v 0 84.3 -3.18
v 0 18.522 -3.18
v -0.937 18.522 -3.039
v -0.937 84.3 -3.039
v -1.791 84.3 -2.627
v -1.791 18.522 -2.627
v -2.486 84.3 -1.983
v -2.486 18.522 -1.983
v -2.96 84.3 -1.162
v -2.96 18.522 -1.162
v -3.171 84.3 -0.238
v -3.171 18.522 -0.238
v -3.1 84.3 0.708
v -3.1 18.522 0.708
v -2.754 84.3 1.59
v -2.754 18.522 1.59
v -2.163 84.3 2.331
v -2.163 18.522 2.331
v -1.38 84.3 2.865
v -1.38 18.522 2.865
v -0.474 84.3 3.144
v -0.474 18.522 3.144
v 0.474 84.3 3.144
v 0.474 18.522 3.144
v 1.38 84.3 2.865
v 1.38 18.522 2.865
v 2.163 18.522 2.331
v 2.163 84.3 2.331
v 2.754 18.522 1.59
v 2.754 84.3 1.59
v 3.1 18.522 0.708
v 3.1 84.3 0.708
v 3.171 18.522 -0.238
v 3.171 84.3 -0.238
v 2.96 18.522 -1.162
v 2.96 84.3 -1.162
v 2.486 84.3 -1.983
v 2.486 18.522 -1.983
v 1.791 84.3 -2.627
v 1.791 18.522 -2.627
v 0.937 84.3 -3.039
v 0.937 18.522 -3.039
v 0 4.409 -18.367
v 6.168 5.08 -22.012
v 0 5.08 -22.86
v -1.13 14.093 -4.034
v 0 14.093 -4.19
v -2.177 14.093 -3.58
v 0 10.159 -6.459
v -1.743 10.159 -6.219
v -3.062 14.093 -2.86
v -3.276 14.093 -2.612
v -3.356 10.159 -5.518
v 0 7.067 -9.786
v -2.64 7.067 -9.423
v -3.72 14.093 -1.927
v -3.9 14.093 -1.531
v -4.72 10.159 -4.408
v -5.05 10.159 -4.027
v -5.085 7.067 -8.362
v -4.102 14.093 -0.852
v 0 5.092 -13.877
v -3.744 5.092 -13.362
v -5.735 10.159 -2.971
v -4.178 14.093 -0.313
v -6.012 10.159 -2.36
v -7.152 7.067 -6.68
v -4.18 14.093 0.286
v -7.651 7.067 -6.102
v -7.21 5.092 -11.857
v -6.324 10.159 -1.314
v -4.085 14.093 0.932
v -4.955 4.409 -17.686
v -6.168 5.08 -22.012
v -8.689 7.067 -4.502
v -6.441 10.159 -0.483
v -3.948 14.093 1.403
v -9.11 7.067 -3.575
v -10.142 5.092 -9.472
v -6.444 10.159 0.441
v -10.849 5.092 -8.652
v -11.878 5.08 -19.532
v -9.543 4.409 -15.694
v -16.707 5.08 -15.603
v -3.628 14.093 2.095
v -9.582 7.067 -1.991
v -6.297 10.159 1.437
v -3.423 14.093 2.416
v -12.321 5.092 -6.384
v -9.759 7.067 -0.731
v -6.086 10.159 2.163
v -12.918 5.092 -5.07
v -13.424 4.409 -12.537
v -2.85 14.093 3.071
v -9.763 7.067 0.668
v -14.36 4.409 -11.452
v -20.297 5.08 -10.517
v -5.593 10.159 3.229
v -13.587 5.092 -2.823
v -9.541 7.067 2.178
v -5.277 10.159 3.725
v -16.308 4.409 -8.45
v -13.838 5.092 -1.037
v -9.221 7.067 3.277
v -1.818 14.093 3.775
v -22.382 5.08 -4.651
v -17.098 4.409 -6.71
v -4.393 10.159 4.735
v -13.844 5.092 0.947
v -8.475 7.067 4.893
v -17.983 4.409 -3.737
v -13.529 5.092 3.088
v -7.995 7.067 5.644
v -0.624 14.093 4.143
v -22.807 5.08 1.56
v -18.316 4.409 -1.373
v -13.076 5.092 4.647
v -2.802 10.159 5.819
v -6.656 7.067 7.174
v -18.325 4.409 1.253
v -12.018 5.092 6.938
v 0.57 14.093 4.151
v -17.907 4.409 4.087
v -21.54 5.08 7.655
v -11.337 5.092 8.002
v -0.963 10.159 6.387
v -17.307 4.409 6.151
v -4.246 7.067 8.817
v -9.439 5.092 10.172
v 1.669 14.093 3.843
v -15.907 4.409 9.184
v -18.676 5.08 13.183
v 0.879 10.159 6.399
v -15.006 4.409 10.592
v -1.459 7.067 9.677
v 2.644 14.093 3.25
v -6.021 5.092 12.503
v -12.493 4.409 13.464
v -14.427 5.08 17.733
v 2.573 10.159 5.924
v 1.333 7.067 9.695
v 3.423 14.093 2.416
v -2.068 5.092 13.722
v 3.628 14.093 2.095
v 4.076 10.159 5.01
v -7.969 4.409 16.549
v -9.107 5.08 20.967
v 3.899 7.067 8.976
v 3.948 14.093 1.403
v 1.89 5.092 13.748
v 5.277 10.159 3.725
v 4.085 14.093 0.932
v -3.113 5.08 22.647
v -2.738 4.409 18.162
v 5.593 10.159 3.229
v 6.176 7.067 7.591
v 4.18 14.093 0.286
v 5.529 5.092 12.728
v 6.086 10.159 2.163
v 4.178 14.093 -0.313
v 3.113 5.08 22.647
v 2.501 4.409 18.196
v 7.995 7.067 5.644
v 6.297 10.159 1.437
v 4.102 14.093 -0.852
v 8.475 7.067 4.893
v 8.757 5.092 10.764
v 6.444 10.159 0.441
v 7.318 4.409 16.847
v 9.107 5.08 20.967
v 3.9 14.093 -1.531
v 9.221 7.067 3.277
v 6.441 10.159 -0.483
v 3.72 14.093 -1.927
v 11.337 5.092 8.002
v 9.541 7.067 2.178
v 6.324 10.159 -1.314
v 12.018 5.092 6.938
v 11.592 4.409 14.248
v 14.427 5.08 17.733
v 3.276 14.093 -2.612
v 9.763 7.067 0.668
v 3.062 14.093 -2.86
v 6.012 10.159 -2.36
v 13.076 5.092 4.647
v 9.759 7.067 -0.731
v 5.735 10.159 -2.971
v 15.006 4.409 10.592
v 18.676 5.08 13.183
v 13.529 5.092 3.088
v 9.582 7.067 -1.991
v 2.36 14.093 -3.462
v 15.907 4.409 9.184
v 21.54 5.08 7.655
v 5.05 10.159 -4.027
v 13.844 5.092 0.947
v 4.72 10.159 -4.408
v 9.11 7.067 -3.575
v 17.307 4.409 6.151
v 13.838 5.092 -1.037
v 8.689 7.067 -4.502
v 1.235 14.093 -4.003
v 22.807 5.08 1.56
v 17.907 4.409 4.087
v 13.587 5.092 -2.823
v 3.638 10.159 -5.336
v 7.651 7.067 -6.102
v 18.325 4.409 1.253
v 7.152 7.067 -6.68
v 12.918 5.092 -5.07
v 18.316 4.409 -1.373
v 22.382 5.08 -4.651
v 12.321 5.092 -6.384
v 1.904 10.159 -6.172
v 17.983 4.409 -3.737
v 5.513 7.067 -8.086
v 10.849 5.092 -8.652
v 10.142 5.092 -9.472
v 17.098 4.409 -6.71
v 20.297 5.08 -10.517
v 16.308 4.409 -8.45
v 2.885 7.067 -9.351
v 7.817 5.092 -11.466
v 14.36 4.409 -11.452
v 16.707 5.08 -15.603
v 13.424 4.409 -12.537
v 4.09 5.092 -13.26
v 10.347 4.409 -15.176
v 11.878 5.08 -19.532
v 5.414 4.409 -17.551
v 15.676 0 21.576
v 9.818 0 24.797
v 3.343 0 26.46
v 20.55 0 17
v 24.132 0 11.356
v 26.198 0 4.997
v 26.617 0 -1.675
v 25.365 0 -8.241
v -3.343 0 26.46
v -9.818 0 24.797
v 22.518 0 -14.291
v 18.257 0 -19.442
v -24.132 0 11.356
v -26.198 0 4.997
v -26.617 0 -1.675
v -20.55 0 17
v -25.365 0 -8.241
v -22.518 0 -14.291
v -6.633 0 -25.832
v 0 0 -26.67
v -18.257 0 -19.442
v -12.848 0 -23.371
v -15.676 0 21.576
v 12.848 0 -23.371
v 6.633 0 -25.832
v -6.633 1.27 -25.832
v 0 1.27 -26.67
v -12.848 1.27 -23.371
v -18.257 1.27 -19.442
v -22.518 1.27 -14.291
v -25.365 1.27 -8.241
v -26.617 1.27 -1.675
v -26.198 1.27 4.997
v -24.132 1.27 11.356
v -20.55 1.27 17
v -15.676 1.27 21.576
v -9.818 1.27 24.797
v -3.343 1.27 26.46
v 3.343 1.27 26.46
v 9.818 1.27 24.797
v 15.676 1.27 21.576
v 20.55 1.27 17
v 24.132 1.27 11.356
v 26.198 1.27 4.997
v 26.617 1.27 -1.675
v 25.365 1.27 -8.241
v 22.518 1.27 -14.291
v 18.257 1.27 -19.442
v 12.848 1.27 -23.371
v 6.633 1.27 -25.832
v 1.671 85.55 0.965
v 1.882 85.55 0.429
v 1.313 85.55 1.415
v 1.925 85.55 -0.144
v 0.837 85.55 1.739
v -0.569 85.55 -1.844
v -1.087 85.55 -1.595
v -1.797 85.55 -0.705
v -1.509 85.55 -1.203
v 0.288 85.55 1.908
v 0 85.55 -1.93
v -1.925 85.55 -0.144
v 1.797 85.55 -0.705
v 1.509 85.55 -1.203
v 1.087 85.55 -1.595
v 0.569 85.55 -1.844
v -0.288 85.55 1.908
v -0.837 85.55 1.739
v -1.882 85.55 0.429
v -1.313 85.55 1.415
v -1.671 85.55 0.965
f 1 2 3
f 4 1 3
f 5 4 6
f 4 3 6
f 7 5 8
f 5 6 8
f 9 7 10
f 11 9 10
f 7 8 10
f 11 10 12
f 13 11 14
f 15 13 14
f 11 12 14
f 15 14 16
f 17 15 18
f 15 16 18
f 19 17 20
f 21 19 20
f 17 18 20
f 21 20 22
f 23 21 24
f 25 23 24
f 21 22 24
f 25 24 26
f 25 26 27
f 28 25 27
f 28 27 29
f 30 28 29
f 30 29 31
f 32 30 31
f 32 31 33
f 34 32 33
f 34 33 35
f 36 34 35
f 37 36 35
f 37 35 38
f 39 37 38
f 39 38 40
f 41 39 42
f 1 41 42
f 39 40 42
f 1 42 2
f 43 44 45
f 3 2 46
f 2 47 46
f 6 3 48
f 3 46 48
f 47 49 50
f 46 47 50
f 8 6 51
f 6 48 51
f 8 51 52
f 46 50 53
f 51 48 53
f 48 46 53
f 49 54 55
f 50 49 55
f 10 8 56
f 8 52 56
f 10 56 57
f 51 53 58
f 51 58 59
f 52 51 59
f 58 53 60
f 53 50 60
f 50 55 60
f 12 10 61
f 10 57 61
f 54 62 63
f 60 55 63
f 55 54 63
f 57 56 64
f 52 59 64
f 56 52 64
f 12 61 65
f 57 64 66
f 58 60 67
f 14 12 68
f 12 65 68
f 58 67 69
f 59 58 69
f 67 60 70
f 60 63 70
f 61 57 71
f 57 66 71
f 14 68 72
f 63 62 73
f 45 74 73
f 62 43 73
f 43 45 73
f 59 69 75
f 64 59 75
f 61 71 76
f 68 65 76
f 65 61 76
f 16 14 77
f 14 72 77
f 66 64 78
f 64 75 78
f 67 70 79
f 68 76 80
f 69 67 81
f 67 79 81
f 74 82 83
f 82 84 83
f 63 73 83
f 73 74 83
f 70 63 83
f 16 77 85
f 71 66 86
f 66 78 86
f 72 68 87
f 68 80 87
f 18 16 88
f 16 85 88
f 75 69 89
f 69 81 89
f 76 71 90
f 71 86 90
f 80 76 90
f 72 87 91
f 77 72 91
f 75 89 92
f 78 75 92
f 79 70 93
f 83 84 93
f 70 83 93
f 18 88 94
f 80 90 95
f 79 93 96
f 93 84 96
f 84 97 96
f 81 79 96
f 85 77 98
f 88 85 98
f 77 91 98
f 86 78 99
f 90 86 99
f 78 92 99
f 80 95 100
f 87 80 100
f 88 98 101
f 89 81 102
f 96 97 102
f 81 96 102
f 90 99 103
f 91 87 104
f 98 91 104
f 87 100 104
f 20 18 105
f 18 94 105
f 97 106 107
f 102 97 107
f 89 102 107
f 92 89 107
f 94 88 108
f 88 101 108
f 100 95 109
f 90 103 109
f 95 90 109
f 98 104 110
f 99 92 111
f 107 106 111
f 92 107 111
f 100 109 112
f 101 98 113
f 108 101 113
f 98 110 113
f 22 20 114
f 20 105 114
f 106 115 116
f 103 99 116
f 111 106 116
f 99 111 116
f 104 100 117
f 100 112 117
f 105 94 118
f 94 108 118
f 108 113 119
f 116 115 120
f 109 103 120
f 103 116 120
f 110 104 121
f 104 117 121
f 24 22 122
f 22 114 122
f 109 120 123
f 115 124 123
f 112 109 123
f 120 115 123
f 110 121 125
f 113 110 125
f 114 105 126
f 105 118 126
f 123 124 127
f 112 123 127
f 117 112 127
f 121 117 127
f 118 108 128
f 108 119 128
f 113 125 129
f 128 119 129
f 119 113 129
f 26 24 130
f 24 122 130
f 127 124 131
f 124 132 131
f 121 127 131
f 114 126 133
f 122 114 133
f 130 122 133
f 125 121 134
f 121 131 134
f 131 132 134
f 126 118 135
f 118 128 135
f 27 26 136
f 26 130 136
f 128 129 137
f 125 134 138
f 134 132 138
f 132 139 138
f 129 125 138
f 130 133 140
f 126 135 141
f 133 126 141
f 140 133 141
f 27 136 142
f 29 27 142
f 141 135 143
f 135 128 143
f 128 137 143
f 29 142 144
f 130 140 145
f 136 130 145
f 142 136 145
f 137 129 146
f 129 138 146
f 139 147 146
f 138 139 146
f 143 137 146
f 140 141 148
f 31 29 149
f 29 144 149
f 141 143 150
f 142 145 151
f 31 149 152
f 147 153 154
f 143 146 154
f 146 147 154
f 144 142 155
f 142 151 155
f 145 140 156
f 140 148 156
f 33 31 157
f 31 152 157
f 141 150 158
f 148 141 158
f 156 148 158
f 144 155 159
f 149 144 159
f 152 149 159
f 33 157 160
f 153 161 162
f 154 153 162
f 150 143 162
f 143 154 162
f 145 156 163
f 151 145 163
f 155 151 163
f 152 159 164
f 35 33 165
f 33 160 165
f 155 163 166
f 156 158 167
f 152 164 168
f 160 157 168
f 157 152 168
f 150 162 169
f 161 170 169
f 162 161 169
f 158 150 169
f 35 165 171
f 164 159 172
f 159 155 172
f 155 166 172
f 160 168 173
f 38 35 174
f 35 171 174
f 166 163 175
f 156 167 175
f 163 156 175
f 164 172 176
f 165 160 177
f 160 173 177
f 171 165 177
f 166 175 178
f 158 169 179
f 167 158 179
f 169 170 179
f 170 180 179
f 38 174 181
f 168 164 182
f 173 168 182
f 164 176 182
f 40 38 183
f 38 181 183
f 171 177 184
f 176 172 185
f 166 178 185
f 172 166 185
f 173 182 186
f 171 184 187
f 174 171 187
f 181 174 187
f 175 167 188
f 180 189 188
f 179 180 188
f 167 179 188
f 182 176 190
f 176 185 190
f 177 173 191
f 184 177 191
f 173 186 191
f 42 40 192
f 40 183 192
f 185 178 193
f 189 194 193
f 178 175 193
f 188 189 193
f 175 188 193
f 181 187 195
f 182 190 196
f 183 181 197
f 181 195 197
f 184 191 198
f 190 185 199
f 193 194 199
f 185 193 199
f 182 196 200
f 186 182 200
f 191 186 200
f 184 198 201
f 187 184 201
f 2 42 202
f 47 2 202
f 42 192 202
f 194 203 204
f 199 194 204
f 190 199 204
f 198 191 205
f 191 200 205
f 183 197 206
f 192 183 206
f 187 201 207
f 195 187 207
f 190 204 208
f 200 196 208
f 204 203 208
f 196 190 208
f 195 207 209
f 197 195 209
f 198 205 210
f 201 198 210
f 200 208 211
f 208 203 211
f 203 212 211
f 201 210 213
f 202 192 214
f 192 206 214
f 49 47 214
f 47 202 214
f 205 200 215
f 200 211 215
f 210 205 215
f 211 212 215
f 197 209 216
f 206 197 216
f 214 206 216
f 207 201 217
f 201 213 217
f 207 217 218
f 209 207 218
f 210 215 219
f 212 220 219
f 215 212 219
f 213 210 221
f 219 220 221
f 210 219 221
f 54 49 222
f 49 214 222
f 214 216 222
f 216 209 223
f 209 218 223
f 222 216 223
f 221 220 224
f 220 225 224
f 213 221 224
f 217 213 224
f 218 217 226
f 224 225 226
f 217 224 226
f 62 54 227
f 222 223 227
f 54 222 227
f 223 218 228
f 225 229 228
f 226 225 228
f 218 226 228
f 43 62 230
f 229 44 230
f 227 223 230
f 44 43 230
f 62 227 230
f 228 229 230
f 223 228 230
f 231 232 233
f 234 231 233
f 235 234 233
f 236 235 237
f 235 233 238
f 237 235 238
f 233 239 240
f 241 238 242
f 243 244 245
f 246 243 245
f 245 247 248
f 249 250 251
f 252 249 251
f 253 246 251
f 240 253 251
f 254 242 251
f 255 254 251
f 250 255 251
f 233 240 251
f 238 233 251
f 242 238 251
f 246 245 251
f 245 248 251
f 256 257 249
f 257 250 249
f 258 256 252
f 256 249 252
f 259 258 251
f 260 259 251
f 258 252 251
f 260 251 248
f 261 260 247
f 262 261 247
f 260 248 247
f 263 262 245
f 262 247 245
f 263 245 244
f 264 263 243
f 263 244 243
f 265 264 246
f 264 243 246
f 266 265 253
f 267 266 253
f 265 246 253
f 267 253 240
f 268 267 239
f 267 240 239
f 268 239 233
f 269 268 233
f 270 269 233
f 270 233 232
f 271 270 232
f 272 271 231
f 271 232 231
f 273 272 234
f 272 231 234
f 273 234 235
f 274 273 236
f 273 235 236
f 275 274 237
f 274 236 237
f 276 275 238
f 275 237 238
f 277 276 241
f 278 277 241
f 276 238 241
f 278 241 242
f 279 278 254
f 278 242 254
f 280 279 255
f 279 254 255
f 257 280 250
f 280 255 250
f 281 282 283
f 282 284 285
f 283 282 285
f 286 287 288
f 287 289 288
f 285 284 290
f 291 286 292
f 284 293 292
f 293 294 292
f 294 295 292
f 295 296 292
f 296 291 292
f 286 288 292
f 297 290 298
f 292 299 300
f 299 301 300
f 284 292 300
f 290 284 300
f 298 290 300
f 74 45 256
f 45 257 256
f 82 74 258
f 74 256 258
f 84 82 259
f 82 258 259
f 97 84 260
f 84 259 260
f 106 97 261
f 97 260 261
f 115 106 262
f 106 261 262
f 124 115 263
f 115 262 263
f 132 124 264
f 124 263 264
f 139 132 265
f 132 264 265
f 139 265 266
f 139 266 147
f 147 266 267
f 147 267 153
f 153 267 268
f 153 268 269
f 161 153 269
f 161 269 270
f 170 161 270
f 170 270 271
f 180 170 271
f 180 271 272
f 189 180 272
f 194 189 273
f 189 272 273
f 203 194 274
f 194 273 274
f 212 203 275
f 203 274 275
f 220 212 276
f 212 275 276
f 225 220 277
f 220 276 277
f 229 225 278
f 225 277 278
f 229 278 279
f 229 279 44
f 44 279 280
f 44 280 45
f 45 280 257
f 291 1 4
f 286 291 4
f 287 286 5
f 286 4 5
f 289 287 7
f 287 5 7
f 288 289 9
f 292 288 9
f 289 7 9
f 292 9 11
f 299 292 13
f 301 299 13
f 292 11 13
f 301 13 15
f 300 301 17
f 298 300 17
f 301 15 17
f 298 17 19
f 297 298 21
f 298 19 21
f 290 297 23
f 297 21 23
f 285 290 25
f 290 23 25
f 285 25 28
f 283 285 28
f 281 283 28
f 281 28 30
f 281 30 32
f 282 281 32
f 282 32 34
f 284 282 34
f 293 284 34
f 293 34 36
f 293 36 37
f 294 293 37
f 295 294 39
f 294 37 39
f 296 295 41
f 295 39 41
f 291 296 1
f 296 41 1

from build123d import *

# Parameters (mm, degrees)
CHAMFER1_SIZE = 1.25


with BuildPart() as part:
    # Sketch1 → Revolve1 (revolve)
    with BuildSketch(Plane(origin=(0, 0, 0), x_dir=(0, 0, -1), z_dir=(1, 0, 0))):
        with BuildLine():
            Line((0, 0), (0, 85.55))
            Line((0, 85.55), (3.18, 85.55))
            Line((3.18, 85.55), (3.18, 18.522021385))
            ThreePointArc((3.18, 18.522021385), (9.786228155, 7.066556842), (22.86, 5.08))
            Line((22.86, 5.08), (26.67, 1.27))
            Line((26.67, 1.27), (26.67, 0))
            Line((26.67, 0), (0, 0))
        make_face()
    revolve(axis=Axis((0, 0, 0), (0, 1, 0)))

    # Chamfer1
    chamfer1_edges = [part.edges().sort_by_distance(p)[0] for p in [
        (0, 85.55, 3.18),
    ]]
    chamfer(chamfer1_edges, length=CHAMFER1_SIZE)


solid = part.part
